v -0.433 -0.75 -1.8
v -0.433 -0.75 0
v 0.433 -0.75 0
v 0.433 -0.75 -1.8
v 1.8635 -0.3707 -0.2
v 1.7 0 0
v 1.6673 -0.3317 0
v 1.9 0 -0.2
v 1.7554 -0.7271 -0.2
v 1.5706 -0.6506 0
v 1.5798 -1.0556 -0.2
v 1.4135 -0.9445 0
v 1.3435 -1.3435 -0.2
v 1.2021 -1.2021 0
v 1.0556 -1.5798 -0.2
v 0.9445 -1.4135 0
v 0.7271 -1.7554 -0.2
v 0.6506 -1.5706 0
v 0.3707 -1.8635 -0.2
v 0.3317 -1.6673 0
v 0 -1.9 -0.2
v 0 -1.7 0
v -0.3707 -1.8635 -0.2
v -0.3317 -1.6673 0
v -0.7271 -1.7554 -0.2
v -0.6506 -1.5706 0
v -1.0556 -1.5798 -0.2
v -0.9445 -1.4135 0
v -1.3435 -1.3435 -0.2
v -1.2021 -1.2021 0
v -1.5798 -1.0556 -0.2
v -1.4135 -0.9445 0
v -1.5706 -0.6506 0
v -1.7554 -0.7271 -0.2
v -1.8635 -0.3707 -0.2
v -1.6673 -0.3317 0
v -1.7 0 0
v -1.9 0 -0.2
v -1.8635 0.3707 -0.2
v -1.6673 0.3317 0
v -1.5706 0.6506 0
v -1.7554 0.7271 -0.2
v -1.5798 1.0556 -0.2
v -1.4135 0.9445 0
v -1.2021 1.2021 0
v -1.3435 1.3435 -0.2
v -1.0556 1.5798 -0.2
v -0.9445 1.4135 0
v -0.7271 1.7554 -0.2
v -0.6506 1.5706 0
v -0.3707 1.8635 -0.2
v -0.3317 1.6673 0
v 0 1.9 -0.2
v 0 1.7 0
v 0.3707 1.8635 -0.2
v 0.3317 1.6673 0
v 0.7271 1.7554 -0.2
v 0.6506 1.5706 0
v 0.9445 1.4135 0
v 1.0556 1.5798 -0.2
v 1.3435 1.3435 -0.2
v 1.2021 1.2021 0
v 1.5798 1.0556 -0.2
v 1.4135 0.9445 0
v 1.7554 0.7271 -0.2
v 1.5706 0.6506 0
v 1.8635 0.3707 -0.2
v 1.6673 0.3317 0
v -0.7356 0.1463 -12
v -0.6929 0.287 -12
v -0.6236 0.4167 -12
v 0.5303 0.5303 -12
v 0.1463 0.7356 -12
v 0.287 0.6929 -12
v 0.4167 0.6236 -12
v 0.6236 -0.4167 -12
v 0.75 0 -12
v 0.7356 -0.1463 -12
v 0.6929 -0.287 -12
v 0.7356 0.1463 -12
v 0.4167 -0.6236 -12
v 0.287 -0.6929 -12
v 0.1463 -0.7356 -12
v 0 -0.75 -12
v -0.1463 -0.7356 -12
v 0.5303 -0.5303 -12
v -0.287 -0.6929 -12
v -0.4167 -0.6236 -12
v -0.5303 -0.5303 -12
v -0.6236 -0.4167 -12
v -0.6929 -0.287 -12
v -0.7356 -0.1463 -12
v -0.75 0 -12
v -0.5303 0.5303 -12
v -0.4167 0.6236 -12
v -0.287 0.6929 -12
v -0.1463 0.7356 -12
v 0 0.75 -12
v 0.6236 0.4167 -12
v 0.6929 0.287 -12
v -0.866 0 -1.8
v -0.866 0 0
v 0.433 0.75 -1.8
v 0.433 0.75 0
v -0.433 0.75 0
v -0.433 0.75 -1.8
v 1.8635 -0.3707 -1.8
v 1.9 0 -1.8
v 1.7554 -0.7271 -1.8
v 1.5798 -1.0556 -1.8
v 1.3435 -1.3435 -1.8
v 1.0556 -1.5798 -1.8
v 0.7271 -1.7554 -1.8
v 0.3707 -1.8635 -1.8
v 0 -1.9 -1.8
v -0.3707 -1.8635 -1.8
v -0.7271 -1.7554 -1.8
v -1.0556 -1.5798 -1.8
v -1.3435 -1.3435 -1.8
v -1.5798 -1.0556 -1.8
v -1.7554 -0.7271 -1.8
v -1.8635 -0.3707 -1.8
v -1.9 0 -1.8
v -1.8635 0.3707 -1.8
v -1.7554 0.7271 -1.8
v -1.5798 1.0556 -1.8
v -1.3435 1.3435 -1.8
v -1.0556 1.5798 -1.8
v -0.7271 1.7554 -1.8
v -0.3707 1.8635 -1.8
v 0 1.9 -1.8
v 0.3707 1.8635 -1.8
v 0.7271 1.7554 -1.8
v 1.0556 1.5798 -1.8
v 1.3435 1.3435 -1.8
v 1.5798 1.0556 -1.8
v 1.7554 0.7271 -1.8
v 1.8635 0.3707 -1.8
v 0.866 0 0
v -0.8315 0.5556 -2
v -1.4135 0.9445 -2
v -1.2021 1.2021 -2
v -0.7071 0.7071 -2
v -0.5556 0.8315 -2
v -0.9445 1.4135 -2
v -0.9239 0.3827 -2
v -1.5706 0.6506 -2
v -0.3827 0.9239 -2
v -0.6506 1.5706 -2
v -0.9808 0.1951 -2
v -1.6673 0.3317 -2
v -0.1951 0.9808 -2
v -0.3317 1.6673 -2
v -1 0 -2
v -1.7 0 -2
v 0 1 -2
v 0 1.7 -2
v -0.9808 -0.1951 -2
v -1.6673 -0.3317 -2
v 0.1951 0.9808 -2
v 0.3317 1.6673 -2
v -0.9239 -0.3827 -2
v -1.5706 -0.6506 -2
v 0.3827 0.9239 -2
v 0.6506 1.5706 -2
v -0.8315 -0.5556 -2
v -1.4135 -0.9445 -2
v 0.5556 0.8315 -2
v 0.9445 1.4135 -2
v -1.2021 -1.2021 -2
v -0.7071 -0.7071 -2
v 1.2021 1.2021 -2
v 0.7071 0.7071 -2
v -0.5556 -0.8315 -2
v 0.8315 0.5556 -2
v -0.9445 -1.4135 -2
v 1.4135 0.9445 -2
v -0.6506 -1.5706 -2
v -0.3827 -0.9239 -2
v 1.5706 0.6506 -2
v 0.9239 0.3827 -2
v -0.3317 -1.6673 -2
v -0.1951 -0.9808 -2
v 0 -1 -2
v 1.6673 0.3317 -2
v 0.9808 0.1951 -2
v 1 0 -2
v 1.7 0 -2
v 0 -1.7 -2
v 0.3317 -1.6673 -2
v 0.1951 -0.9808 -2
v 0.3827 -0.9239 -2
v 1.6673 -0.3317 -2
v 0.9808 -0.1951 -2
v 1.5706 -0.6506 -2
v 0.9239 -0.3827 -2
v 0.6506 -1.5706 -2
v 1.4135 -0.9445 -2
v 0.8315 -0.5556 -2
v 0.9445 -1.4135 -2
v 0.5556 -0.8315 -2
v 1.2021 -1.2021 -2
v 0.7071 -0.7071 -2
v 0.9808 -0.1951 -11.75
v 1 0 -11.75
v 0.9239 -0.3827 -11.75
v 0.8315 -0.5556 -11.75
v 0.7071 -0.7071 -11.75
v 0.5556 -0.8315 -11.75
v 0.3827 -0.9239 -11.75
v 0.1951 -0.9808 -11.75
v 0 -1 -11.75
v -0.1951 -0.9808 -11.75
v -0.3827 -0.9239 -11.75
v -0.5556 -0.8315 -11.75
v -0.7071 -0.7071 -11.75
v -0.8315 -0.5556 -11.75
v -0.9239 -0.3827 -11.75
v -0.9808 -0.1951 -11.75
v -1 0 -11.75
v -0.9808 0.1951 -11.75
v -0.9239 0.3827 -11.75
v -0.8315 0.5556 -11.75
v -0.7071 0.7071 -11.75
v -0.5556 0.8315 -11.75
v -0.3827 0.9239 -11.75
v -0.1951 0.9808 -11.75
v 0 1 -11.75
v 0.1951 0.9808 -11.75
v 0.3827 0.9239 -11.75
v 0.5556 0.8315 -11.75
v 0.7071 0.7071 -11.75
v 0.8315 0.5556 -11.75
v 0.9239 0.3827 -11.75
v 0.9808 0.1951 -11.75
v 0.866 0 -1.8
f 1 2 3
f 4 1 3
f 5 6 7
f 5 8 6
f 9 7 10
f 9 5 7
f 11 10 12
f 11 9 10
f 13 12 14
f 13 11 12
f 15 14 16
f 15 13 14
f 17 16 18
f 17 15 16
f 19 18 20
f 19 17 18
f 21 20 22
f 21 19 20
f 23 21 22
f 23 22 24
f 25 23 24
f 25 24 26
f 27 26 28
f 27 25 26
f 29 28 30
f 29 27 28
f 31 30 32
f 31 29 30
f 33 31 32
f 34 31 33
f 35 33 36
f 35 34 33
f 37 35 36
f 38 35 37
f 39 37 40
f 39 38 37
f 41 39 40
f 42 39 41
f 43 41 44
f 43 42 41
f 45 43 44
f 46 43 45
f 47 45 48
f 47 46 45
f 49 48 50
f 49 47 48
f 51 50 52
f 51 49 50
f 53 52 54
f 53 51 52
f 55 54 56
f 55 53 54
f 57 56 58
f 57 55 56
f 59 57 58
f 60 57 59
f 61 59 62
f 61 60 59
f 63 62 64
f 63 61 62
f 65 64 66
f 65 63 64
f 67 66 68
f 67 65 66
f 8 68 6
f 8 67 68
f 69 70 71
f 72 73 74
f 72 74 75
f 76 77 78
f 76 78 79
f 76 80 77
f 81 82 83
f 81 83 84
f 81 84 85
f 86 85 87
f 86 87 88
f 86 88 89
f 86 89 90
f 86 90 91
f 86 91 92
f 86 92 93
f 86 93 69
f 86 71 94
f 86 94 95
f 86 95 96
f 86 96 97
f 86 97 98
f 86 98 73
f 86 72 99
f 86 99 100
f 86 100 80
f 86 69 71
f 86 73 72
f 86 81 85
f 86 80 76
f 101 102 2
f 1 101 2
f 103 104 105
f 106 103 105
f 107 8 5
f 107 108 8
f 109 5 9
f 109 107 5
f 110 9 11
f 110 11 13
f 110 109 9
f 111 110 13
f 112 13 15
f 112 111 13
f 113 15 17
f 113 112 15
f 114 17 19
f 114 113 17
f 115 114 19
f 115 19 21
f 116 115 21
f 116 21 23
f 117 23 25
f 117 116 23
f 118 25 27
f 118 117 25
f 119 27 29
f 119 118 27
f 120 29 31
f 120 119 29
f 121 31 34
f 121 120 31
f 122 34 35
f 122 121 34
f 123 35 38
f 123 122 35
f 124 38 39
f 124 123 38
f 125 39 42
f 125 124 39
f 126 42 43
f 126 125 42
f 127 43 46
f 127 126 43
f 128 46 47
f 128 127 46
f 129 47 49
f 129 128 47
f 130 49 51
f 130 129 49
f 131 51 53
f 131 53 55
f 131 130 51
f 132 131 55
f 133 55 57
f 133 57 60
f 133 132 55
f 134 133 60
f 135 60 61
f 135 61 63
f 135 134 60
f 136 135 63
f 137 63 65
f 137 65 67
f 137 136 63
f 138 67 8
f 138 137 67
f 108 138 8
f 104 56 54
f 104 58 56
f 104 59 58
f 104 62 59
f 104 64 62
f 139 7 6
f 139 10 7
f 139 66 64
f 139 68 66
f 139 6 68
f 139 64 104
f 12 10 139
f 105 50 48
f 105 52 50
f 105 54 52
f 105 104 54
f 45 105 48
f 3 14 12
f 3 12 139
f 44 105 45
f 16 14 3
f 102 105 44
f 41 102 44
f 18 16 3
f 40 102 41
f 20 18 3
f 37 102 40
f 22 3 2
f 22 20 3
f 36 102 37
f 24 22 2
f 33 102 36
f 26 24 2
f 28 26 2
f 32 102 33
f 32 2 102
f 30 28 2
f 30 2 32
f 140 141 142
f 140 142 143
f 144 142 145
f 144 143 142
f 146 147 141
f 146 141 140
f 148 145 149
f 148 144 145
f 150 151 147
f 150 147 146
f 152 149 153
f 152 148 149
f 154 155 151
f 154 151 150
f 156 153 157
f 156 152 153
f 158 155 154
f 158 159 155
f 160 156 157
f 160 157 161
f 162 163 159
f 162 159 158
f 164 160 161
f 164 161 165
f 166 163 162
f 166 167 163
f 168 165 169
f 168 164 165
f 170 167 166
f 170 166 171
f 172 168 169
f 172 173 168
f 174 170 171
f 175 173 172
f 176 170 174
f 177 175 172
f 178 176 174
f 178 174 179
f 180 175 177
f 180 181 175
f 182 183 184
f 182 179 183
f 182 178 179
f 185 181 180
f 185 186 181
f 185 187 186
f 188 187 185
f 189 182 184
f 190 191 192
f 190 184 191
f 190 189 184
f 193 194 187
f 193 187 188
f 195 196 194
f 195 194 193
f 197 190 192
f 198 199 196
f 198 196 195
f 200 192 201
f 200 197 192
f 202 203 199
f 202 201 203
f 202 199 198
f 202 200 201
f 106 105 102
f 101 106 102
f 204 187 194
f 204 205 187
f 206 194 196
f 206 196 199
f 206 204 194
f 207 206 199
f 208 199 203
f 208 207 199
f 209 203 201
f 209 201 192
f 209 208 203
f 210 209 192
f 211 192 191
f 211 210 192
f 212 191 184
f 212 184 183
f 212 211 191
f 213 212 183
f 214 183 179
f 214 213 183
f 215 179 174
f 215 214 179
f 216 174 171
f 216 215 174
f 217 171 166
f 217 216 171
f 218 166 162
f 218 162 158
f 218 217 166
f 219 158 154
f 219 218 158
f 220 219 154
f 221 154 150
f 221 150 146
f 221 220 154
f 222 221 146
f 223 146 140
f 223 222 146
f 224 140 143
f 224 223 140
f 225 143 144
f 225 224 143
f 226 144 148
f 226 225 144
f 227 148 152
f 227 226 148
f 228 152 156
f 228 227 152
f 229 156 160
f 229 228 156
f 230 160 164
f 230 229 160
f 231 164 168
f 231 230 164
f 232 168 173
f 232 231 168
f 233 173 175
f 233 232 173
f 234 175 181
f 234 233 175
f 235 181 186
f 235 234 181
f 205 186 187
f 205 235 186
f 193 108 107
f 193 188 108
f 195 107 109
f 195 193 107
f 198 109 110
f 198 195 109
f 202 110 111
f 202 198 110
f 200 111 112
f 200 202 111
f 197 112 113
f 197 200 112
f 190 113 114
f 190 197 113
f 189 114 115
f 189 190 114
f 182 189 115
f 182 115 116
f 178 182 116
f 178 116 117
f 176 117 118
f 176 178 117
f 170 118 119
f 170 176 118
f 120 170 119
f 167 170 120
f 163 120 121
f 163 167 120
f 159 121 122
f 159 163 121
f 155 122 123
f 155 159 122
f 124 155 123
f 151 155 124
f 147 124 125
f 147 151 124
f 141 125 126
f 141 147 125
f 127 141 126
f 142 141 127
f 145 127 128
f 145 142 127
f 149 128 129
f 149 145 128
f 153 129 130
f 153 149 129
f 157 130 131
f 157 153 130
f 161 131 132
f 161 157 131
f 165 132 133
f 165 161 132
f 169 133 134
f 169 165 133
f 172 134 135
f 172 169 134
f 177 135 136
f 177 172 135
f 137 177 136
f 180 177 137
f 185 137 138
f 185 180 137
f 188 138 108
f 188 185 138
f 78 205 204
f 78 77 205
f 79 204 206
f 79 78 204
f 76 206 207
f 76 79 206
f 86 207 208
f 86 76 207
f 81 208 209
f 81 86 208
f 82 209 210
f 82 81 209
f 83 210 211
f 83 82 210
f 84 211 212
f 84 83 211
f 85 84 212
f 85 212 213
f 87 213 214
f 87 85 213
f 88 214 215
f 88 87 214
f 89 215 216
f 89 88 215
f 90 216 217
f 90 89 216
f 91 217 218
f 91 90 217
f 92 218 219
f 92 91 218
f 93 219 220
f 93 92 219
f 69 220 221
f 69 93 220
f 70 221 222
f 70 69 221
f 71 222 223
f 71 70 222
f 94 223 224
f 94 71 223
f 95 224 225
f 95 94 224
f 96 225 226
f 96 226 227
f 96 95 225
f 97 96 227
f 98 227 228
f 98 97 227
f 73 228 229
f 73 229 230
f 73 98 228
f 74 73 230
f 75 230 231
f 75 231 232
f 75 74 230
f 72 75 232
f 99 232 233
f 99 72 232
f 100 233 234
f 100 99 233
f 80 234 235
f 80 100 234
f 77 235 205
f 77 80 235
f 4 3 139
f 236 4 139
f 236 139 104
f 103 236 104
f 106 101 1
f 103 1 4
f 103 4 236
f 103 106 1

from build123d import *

# Parameters (mm, degrees)
CUT_EXTRUDE_1_DEPTH = 1.8


with BuildPart() as part:
    # Эскиз1 → Повернуть1 (revolve)
    with BuildSketch(Plane(origin=(0, 0, 0), x_dir=(1, 0, 0), z_dir=(0, 1, 0))):
        Polygon((0, 0), (1.7, 0), (1.9, 0.2), (1.9, 1.8), (1.7, 2), (1, 2), (1, 11.75), (0.75, 12), (0, 12), align=None)
    revolve(axis=Axis((0, 0, 0), (0, 0, -1)))

    # Эскиз2 → Вырез-Вытянуть1 (cut)
    with BuildSketch(Plane.XY):
        Polygon((0.866025404, 0), (0.433012702, 0.75), (-0.433012702, 0.75), (-0.866025404, 0), (-0.433012702, -0.75), (0.433012702, -0.75), align=None)
    extrude(amount=-CUT_EXTRUDE_1_DEPTH, mode=Mode.SUBTRACT)


solid = part.part
